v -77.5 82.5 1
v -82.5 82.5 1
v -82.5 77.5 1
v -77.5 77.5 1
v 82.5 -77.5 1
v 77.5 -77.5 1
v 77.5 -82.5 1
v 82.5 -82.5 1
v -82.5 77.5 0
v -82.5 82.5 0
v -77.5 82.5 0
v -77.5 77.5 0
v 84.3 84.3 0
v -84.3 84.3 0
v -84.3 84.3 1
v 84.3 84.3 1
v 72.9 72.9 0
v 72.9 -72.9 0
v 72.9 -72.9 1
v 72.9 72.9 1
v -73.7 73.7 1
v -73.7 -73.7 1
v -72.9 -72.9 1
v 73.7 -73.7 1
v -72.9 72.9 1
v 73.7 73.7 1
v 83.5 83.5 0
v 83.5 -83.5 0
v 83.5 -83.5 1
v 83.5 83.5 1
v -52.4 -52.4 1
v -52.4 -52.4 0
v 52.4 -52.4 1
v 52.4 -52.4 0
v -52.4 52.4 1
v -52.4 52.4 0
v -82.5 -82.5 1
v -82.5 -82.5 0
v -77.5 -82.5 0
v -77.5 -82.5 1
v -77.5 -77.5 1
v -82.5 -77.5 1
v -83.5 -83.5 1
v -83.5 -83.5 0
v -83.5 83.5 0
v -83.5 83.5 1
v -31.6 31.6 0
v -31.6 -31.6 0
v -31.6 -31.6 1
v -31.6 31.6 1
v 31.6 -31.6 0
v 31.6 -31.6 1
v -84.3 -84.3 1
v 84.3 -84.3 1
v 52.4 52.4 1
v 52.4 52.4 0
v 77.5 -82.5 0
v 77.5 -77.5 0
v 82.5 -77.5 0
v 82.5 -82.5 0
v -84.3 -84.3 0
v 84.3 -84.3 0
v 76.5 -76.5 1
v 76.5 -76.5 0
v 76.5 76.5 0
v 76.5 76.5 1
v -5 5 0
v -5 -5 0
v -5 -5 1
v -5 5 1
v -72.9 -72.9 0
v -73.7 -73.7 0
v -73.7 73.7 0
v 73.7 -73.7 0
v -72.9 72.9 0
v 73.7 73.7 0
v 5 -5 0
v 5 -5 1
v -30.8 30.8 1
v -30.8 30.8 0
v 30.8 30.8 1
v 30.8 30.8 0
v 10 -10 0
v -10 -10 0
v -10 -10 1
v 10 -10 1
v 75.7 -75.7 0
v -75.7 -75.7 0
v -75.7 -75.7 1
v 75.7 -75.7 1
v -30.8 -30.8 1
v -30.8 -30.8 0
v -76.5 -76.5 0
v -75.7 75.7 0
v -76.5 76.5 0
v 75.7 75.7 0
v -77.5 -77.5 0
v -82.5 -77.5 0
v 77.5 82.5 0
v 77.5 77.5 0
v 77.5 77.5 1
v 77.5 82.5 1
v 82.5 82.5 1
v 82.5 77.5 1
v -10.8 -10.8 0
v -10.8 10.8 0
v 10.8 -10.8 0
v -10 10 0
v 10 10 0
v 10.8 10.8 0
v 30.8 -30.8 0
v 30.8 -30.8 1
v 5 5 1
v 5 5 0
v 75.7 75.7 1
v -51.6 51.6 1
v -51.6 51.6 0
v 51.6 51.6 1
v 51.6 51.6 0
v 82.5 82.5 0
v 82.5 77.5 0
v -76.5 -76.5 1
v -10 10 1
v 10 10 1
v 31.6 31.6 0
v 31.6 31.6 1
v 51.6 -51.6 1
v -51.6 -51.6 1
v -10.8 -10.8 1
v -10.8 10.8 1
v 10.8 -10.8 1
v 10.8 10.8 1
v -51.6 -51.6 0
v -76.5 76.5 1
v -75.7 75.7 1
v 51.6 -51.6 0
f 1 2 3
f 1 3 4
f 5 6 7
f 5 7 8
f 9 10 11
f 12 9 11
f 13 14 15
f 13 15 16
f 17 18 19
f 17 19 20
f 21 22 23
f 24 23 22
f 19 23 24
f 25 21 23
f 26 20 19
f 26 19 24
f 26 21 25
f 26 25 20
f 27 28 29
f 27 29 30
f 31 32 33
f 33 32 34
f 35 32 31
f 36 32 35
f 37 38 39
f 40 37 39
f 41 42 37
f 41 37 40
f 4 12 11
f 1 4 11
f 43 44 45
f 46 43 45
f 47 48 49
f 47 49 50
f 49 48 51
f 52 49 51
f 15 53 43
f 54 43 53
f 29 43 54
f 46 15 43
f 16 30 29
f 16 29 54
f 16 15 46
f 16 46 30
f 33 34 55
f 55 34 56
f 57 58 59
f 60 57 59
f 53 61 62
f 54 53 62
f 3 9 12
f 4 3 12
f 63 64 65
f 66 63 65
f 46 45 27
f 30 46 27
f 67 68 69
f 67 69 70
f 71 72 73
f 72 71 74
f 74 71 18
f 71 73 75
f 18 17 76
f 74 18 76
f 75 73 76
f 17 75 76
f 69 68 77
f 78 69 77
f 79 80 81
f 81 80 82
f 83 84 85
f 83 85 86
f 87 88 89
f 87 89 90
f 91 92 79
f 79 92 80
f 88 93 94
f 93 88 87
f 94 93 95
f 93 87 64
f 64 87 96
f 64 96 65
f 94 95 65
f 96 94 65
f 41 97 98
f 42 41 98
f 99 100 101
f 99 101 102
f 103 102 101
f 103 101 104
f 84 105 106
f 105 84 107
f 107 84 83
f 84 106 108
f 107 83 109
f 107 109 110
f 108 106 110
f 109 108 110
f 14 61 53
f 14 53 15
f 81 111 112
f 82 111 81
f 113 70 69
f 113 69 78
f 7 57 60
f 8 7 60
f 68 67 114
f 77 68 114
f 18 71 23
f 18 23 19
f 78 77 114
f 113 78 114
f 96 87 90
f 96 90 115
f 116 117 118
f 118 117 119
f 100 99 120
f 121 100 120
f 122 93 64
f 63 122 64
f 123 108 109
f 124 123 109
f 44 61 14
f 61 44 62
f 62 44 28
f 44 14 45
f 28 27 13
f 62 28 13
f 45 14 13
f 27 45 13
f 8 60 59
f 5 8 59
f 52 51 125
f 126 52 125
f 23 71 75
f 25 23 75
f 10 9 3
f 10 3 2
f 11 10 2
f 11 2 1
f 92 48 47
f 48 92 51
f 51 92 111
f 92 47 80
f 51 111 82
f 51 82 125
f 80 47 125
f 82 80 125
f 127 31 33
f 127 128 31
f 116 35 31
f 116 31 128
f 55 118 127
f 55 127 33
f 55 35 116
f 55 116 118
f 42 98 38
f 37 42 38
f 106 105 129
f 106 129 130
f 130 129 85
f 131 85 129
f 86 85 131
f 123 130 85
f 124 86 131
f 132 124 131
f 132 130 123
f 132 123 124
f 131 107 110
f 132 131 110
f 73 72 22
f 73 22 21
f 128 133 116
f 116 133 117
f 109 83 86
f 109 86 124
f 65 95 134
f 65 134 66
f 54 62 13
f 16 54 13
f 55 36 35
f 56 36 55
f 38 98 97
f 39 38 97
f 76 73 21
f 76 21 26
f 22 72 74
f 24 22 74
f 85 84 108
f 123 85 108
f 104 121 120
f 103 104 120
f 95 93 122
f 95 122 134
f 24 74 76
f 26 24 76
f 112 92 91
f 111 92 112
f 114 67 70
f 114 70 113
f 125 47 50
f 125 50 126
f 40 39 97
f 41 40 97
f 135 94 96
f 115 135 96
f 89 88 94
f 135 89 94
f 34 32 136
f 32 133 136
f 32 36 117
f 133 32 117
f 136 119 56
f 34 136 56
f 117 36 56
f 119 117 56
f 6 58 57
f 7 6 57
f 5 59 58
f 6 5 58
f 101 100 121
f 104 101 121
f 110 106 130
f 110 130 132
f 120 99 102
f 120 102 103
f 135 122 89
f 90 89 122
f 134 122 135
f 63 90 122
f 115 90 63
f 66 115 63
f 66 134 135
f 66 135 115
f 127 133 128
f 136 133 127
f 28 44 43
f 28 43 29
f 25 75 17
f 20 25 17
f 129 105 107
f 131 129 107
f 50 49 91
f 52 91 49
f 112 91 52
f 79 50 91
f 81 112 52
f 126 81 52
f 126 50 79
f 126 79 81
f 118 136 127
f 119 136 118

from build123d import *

# Parameters (mm, degrees)
F0_W     = 168.6
F0_H     = 168.6
F0_W_2   = 167
F0_H_2   = 167
F1_DEPTH = 1
F0_W_3   = 5
F0_H_3   = 5
F0_W_4   = 153
F0_H_4   = 153
F0_W_5   = 151.4
F0_H_5   = 151.4
F0_W_6   = 147.4
F0_H_6   = 147.4
F0_W_7   = 145.8
F0_H_7   = 145.8
F0_W_8   = 104.8
F0_H_8   = 104.8
F0_W_9   = 103.2
F0_H_9   = 103.2
F0_W_10  = 63.2
F0_H_10  = 63.2
F0_W_11  = 61.6
F0_H_11  = 61.6
F0_W_12  = 21.6
F0_H_12  = 21.6
F0_W_13  = 20
F0_H_13  = 20
F0_W_14  = 10
F0_H_14  = 10


# Not quite as in the source:
# - a feature names something its author has since deleted; it is built from what else it names


with BuildPart() as f1:
    # F0 (on Top) → F1 (new body)
    with BuildSketch(Plane.XY):
        Rectangle(F0_W, F0_H)
        Rectangle(F0_W_2, F0_H_2, mode=Mode.SUBTRACT)
    extrude(amount=F1_DEPTH)


with BuildPart() as f1b:
    # F0 (on Top) → F1, piece 2 (new body)
    with BuildSketch(Plane.XY):
        with Locations((-80, 80)):
            Rectangle(F0_W_3, F0_H_3)
    extrude(amount=F1_DEPTH)


with BuildPart() as f1c:
    # F0 (on Top) → F1, piece 3 (new body)
    with BuildSketch(Plane.XY):
        Rectangle(F0_W_4, F0_H_4)
        Rectangle(F0_W_5, F0_H_5, mode=Mode.SUBTRACT)
    extrude(amount=F1_DEPTH)


with BuildPart() as f1d:
    # F0 (on Top) → F1, piece 4 (new body)
    with BuildSketch(Plane.XY):
        Rectangle(F0_W_6, F0_H_6)
        Rectangle(F0_W_7, F0_H_7, mode=Mode.SUBTRACT)
    extrude(amount=F1_DEPTH)


with BuildPart() as f1e:
    # F0 (on Top) → F1, piece 5 (new body)
    with BuildSketch(Plane.XY):
        Rectangle(F0_W_8, F0_H_8)
        Rectangle(F0_W_9, F0_H_9, mode=Mode.SUBTRACT)
    extrude(amount=F1_DEPTH)


with BuildPart() as f1f:
    # F0 (on Top) → F1, piece 6 (new body)
    with BuildSketch(Plane.XY):
        Rectangle(F0_W_10, F0_H_10)
        Rectangle(F0_W_11, F0_H_11, mode=Mode.SUBTRACT)
    extrude(amount=F1_DEPTH)


with BuildPart() as f1g:
    # F0 (on Top) → F1, piece 7 (new body)
    with BuildSketch(Plane.XY):
        Rectangle(F0_W_12, F0_H_12)
        Rectangle(F0_W_13, F0_H_13, mode=Mode.SUBTRACT)
    extrude(amount=F1_DEPTH)


with BuildPart() as f1h:
    # F0 (on Top) → F1, piece 8 (new body)
    with BuildSketch(Plane.XY):
        Rectangle(F0_W_14, F0_H_14)
    extrude(amount=F1_DEPTH)


with BuildPart() as f1i:
    # F0 (on Top) → F1, piece 9 (new body)
    with BuildSketch(Plane.XY):
        with Locations((80, 80)):
            Rectangle(F0_W_3, F0_H_3)
    extrude(amount=F1_DEPTH)


with BuildPart() as f1j:
    # F0 (on Top) → F1, piece 10 (new body)
    with BuildSketch(Plane.XY):
        Polygon((77.5, -77.5), (77.5, -80), (77.5, -82.5), (82.5, -82.5), (82.5, -77.5), align=None)
    extrude(amount=F1_DEPTH)


with BuildPart() as f1k:
    # F0 (on Top) → F1, piece 11 (new body)
    with BuildSketch(Plane.XY):
        Polygon((-77.5, -77.5), (-82.5, -77.5), (-82.5, -82.5), (-77.5, -82.5), (-77.5, -80), align=None)
    extrude(amount=F1_DEPTH)


solid = Compound([f1.part, f1b.part, f1c.part, f1d.part, f1e.part, f1f.part, f1g.part, f1h.part, f1i.part, f1j.part, f1k.part])
